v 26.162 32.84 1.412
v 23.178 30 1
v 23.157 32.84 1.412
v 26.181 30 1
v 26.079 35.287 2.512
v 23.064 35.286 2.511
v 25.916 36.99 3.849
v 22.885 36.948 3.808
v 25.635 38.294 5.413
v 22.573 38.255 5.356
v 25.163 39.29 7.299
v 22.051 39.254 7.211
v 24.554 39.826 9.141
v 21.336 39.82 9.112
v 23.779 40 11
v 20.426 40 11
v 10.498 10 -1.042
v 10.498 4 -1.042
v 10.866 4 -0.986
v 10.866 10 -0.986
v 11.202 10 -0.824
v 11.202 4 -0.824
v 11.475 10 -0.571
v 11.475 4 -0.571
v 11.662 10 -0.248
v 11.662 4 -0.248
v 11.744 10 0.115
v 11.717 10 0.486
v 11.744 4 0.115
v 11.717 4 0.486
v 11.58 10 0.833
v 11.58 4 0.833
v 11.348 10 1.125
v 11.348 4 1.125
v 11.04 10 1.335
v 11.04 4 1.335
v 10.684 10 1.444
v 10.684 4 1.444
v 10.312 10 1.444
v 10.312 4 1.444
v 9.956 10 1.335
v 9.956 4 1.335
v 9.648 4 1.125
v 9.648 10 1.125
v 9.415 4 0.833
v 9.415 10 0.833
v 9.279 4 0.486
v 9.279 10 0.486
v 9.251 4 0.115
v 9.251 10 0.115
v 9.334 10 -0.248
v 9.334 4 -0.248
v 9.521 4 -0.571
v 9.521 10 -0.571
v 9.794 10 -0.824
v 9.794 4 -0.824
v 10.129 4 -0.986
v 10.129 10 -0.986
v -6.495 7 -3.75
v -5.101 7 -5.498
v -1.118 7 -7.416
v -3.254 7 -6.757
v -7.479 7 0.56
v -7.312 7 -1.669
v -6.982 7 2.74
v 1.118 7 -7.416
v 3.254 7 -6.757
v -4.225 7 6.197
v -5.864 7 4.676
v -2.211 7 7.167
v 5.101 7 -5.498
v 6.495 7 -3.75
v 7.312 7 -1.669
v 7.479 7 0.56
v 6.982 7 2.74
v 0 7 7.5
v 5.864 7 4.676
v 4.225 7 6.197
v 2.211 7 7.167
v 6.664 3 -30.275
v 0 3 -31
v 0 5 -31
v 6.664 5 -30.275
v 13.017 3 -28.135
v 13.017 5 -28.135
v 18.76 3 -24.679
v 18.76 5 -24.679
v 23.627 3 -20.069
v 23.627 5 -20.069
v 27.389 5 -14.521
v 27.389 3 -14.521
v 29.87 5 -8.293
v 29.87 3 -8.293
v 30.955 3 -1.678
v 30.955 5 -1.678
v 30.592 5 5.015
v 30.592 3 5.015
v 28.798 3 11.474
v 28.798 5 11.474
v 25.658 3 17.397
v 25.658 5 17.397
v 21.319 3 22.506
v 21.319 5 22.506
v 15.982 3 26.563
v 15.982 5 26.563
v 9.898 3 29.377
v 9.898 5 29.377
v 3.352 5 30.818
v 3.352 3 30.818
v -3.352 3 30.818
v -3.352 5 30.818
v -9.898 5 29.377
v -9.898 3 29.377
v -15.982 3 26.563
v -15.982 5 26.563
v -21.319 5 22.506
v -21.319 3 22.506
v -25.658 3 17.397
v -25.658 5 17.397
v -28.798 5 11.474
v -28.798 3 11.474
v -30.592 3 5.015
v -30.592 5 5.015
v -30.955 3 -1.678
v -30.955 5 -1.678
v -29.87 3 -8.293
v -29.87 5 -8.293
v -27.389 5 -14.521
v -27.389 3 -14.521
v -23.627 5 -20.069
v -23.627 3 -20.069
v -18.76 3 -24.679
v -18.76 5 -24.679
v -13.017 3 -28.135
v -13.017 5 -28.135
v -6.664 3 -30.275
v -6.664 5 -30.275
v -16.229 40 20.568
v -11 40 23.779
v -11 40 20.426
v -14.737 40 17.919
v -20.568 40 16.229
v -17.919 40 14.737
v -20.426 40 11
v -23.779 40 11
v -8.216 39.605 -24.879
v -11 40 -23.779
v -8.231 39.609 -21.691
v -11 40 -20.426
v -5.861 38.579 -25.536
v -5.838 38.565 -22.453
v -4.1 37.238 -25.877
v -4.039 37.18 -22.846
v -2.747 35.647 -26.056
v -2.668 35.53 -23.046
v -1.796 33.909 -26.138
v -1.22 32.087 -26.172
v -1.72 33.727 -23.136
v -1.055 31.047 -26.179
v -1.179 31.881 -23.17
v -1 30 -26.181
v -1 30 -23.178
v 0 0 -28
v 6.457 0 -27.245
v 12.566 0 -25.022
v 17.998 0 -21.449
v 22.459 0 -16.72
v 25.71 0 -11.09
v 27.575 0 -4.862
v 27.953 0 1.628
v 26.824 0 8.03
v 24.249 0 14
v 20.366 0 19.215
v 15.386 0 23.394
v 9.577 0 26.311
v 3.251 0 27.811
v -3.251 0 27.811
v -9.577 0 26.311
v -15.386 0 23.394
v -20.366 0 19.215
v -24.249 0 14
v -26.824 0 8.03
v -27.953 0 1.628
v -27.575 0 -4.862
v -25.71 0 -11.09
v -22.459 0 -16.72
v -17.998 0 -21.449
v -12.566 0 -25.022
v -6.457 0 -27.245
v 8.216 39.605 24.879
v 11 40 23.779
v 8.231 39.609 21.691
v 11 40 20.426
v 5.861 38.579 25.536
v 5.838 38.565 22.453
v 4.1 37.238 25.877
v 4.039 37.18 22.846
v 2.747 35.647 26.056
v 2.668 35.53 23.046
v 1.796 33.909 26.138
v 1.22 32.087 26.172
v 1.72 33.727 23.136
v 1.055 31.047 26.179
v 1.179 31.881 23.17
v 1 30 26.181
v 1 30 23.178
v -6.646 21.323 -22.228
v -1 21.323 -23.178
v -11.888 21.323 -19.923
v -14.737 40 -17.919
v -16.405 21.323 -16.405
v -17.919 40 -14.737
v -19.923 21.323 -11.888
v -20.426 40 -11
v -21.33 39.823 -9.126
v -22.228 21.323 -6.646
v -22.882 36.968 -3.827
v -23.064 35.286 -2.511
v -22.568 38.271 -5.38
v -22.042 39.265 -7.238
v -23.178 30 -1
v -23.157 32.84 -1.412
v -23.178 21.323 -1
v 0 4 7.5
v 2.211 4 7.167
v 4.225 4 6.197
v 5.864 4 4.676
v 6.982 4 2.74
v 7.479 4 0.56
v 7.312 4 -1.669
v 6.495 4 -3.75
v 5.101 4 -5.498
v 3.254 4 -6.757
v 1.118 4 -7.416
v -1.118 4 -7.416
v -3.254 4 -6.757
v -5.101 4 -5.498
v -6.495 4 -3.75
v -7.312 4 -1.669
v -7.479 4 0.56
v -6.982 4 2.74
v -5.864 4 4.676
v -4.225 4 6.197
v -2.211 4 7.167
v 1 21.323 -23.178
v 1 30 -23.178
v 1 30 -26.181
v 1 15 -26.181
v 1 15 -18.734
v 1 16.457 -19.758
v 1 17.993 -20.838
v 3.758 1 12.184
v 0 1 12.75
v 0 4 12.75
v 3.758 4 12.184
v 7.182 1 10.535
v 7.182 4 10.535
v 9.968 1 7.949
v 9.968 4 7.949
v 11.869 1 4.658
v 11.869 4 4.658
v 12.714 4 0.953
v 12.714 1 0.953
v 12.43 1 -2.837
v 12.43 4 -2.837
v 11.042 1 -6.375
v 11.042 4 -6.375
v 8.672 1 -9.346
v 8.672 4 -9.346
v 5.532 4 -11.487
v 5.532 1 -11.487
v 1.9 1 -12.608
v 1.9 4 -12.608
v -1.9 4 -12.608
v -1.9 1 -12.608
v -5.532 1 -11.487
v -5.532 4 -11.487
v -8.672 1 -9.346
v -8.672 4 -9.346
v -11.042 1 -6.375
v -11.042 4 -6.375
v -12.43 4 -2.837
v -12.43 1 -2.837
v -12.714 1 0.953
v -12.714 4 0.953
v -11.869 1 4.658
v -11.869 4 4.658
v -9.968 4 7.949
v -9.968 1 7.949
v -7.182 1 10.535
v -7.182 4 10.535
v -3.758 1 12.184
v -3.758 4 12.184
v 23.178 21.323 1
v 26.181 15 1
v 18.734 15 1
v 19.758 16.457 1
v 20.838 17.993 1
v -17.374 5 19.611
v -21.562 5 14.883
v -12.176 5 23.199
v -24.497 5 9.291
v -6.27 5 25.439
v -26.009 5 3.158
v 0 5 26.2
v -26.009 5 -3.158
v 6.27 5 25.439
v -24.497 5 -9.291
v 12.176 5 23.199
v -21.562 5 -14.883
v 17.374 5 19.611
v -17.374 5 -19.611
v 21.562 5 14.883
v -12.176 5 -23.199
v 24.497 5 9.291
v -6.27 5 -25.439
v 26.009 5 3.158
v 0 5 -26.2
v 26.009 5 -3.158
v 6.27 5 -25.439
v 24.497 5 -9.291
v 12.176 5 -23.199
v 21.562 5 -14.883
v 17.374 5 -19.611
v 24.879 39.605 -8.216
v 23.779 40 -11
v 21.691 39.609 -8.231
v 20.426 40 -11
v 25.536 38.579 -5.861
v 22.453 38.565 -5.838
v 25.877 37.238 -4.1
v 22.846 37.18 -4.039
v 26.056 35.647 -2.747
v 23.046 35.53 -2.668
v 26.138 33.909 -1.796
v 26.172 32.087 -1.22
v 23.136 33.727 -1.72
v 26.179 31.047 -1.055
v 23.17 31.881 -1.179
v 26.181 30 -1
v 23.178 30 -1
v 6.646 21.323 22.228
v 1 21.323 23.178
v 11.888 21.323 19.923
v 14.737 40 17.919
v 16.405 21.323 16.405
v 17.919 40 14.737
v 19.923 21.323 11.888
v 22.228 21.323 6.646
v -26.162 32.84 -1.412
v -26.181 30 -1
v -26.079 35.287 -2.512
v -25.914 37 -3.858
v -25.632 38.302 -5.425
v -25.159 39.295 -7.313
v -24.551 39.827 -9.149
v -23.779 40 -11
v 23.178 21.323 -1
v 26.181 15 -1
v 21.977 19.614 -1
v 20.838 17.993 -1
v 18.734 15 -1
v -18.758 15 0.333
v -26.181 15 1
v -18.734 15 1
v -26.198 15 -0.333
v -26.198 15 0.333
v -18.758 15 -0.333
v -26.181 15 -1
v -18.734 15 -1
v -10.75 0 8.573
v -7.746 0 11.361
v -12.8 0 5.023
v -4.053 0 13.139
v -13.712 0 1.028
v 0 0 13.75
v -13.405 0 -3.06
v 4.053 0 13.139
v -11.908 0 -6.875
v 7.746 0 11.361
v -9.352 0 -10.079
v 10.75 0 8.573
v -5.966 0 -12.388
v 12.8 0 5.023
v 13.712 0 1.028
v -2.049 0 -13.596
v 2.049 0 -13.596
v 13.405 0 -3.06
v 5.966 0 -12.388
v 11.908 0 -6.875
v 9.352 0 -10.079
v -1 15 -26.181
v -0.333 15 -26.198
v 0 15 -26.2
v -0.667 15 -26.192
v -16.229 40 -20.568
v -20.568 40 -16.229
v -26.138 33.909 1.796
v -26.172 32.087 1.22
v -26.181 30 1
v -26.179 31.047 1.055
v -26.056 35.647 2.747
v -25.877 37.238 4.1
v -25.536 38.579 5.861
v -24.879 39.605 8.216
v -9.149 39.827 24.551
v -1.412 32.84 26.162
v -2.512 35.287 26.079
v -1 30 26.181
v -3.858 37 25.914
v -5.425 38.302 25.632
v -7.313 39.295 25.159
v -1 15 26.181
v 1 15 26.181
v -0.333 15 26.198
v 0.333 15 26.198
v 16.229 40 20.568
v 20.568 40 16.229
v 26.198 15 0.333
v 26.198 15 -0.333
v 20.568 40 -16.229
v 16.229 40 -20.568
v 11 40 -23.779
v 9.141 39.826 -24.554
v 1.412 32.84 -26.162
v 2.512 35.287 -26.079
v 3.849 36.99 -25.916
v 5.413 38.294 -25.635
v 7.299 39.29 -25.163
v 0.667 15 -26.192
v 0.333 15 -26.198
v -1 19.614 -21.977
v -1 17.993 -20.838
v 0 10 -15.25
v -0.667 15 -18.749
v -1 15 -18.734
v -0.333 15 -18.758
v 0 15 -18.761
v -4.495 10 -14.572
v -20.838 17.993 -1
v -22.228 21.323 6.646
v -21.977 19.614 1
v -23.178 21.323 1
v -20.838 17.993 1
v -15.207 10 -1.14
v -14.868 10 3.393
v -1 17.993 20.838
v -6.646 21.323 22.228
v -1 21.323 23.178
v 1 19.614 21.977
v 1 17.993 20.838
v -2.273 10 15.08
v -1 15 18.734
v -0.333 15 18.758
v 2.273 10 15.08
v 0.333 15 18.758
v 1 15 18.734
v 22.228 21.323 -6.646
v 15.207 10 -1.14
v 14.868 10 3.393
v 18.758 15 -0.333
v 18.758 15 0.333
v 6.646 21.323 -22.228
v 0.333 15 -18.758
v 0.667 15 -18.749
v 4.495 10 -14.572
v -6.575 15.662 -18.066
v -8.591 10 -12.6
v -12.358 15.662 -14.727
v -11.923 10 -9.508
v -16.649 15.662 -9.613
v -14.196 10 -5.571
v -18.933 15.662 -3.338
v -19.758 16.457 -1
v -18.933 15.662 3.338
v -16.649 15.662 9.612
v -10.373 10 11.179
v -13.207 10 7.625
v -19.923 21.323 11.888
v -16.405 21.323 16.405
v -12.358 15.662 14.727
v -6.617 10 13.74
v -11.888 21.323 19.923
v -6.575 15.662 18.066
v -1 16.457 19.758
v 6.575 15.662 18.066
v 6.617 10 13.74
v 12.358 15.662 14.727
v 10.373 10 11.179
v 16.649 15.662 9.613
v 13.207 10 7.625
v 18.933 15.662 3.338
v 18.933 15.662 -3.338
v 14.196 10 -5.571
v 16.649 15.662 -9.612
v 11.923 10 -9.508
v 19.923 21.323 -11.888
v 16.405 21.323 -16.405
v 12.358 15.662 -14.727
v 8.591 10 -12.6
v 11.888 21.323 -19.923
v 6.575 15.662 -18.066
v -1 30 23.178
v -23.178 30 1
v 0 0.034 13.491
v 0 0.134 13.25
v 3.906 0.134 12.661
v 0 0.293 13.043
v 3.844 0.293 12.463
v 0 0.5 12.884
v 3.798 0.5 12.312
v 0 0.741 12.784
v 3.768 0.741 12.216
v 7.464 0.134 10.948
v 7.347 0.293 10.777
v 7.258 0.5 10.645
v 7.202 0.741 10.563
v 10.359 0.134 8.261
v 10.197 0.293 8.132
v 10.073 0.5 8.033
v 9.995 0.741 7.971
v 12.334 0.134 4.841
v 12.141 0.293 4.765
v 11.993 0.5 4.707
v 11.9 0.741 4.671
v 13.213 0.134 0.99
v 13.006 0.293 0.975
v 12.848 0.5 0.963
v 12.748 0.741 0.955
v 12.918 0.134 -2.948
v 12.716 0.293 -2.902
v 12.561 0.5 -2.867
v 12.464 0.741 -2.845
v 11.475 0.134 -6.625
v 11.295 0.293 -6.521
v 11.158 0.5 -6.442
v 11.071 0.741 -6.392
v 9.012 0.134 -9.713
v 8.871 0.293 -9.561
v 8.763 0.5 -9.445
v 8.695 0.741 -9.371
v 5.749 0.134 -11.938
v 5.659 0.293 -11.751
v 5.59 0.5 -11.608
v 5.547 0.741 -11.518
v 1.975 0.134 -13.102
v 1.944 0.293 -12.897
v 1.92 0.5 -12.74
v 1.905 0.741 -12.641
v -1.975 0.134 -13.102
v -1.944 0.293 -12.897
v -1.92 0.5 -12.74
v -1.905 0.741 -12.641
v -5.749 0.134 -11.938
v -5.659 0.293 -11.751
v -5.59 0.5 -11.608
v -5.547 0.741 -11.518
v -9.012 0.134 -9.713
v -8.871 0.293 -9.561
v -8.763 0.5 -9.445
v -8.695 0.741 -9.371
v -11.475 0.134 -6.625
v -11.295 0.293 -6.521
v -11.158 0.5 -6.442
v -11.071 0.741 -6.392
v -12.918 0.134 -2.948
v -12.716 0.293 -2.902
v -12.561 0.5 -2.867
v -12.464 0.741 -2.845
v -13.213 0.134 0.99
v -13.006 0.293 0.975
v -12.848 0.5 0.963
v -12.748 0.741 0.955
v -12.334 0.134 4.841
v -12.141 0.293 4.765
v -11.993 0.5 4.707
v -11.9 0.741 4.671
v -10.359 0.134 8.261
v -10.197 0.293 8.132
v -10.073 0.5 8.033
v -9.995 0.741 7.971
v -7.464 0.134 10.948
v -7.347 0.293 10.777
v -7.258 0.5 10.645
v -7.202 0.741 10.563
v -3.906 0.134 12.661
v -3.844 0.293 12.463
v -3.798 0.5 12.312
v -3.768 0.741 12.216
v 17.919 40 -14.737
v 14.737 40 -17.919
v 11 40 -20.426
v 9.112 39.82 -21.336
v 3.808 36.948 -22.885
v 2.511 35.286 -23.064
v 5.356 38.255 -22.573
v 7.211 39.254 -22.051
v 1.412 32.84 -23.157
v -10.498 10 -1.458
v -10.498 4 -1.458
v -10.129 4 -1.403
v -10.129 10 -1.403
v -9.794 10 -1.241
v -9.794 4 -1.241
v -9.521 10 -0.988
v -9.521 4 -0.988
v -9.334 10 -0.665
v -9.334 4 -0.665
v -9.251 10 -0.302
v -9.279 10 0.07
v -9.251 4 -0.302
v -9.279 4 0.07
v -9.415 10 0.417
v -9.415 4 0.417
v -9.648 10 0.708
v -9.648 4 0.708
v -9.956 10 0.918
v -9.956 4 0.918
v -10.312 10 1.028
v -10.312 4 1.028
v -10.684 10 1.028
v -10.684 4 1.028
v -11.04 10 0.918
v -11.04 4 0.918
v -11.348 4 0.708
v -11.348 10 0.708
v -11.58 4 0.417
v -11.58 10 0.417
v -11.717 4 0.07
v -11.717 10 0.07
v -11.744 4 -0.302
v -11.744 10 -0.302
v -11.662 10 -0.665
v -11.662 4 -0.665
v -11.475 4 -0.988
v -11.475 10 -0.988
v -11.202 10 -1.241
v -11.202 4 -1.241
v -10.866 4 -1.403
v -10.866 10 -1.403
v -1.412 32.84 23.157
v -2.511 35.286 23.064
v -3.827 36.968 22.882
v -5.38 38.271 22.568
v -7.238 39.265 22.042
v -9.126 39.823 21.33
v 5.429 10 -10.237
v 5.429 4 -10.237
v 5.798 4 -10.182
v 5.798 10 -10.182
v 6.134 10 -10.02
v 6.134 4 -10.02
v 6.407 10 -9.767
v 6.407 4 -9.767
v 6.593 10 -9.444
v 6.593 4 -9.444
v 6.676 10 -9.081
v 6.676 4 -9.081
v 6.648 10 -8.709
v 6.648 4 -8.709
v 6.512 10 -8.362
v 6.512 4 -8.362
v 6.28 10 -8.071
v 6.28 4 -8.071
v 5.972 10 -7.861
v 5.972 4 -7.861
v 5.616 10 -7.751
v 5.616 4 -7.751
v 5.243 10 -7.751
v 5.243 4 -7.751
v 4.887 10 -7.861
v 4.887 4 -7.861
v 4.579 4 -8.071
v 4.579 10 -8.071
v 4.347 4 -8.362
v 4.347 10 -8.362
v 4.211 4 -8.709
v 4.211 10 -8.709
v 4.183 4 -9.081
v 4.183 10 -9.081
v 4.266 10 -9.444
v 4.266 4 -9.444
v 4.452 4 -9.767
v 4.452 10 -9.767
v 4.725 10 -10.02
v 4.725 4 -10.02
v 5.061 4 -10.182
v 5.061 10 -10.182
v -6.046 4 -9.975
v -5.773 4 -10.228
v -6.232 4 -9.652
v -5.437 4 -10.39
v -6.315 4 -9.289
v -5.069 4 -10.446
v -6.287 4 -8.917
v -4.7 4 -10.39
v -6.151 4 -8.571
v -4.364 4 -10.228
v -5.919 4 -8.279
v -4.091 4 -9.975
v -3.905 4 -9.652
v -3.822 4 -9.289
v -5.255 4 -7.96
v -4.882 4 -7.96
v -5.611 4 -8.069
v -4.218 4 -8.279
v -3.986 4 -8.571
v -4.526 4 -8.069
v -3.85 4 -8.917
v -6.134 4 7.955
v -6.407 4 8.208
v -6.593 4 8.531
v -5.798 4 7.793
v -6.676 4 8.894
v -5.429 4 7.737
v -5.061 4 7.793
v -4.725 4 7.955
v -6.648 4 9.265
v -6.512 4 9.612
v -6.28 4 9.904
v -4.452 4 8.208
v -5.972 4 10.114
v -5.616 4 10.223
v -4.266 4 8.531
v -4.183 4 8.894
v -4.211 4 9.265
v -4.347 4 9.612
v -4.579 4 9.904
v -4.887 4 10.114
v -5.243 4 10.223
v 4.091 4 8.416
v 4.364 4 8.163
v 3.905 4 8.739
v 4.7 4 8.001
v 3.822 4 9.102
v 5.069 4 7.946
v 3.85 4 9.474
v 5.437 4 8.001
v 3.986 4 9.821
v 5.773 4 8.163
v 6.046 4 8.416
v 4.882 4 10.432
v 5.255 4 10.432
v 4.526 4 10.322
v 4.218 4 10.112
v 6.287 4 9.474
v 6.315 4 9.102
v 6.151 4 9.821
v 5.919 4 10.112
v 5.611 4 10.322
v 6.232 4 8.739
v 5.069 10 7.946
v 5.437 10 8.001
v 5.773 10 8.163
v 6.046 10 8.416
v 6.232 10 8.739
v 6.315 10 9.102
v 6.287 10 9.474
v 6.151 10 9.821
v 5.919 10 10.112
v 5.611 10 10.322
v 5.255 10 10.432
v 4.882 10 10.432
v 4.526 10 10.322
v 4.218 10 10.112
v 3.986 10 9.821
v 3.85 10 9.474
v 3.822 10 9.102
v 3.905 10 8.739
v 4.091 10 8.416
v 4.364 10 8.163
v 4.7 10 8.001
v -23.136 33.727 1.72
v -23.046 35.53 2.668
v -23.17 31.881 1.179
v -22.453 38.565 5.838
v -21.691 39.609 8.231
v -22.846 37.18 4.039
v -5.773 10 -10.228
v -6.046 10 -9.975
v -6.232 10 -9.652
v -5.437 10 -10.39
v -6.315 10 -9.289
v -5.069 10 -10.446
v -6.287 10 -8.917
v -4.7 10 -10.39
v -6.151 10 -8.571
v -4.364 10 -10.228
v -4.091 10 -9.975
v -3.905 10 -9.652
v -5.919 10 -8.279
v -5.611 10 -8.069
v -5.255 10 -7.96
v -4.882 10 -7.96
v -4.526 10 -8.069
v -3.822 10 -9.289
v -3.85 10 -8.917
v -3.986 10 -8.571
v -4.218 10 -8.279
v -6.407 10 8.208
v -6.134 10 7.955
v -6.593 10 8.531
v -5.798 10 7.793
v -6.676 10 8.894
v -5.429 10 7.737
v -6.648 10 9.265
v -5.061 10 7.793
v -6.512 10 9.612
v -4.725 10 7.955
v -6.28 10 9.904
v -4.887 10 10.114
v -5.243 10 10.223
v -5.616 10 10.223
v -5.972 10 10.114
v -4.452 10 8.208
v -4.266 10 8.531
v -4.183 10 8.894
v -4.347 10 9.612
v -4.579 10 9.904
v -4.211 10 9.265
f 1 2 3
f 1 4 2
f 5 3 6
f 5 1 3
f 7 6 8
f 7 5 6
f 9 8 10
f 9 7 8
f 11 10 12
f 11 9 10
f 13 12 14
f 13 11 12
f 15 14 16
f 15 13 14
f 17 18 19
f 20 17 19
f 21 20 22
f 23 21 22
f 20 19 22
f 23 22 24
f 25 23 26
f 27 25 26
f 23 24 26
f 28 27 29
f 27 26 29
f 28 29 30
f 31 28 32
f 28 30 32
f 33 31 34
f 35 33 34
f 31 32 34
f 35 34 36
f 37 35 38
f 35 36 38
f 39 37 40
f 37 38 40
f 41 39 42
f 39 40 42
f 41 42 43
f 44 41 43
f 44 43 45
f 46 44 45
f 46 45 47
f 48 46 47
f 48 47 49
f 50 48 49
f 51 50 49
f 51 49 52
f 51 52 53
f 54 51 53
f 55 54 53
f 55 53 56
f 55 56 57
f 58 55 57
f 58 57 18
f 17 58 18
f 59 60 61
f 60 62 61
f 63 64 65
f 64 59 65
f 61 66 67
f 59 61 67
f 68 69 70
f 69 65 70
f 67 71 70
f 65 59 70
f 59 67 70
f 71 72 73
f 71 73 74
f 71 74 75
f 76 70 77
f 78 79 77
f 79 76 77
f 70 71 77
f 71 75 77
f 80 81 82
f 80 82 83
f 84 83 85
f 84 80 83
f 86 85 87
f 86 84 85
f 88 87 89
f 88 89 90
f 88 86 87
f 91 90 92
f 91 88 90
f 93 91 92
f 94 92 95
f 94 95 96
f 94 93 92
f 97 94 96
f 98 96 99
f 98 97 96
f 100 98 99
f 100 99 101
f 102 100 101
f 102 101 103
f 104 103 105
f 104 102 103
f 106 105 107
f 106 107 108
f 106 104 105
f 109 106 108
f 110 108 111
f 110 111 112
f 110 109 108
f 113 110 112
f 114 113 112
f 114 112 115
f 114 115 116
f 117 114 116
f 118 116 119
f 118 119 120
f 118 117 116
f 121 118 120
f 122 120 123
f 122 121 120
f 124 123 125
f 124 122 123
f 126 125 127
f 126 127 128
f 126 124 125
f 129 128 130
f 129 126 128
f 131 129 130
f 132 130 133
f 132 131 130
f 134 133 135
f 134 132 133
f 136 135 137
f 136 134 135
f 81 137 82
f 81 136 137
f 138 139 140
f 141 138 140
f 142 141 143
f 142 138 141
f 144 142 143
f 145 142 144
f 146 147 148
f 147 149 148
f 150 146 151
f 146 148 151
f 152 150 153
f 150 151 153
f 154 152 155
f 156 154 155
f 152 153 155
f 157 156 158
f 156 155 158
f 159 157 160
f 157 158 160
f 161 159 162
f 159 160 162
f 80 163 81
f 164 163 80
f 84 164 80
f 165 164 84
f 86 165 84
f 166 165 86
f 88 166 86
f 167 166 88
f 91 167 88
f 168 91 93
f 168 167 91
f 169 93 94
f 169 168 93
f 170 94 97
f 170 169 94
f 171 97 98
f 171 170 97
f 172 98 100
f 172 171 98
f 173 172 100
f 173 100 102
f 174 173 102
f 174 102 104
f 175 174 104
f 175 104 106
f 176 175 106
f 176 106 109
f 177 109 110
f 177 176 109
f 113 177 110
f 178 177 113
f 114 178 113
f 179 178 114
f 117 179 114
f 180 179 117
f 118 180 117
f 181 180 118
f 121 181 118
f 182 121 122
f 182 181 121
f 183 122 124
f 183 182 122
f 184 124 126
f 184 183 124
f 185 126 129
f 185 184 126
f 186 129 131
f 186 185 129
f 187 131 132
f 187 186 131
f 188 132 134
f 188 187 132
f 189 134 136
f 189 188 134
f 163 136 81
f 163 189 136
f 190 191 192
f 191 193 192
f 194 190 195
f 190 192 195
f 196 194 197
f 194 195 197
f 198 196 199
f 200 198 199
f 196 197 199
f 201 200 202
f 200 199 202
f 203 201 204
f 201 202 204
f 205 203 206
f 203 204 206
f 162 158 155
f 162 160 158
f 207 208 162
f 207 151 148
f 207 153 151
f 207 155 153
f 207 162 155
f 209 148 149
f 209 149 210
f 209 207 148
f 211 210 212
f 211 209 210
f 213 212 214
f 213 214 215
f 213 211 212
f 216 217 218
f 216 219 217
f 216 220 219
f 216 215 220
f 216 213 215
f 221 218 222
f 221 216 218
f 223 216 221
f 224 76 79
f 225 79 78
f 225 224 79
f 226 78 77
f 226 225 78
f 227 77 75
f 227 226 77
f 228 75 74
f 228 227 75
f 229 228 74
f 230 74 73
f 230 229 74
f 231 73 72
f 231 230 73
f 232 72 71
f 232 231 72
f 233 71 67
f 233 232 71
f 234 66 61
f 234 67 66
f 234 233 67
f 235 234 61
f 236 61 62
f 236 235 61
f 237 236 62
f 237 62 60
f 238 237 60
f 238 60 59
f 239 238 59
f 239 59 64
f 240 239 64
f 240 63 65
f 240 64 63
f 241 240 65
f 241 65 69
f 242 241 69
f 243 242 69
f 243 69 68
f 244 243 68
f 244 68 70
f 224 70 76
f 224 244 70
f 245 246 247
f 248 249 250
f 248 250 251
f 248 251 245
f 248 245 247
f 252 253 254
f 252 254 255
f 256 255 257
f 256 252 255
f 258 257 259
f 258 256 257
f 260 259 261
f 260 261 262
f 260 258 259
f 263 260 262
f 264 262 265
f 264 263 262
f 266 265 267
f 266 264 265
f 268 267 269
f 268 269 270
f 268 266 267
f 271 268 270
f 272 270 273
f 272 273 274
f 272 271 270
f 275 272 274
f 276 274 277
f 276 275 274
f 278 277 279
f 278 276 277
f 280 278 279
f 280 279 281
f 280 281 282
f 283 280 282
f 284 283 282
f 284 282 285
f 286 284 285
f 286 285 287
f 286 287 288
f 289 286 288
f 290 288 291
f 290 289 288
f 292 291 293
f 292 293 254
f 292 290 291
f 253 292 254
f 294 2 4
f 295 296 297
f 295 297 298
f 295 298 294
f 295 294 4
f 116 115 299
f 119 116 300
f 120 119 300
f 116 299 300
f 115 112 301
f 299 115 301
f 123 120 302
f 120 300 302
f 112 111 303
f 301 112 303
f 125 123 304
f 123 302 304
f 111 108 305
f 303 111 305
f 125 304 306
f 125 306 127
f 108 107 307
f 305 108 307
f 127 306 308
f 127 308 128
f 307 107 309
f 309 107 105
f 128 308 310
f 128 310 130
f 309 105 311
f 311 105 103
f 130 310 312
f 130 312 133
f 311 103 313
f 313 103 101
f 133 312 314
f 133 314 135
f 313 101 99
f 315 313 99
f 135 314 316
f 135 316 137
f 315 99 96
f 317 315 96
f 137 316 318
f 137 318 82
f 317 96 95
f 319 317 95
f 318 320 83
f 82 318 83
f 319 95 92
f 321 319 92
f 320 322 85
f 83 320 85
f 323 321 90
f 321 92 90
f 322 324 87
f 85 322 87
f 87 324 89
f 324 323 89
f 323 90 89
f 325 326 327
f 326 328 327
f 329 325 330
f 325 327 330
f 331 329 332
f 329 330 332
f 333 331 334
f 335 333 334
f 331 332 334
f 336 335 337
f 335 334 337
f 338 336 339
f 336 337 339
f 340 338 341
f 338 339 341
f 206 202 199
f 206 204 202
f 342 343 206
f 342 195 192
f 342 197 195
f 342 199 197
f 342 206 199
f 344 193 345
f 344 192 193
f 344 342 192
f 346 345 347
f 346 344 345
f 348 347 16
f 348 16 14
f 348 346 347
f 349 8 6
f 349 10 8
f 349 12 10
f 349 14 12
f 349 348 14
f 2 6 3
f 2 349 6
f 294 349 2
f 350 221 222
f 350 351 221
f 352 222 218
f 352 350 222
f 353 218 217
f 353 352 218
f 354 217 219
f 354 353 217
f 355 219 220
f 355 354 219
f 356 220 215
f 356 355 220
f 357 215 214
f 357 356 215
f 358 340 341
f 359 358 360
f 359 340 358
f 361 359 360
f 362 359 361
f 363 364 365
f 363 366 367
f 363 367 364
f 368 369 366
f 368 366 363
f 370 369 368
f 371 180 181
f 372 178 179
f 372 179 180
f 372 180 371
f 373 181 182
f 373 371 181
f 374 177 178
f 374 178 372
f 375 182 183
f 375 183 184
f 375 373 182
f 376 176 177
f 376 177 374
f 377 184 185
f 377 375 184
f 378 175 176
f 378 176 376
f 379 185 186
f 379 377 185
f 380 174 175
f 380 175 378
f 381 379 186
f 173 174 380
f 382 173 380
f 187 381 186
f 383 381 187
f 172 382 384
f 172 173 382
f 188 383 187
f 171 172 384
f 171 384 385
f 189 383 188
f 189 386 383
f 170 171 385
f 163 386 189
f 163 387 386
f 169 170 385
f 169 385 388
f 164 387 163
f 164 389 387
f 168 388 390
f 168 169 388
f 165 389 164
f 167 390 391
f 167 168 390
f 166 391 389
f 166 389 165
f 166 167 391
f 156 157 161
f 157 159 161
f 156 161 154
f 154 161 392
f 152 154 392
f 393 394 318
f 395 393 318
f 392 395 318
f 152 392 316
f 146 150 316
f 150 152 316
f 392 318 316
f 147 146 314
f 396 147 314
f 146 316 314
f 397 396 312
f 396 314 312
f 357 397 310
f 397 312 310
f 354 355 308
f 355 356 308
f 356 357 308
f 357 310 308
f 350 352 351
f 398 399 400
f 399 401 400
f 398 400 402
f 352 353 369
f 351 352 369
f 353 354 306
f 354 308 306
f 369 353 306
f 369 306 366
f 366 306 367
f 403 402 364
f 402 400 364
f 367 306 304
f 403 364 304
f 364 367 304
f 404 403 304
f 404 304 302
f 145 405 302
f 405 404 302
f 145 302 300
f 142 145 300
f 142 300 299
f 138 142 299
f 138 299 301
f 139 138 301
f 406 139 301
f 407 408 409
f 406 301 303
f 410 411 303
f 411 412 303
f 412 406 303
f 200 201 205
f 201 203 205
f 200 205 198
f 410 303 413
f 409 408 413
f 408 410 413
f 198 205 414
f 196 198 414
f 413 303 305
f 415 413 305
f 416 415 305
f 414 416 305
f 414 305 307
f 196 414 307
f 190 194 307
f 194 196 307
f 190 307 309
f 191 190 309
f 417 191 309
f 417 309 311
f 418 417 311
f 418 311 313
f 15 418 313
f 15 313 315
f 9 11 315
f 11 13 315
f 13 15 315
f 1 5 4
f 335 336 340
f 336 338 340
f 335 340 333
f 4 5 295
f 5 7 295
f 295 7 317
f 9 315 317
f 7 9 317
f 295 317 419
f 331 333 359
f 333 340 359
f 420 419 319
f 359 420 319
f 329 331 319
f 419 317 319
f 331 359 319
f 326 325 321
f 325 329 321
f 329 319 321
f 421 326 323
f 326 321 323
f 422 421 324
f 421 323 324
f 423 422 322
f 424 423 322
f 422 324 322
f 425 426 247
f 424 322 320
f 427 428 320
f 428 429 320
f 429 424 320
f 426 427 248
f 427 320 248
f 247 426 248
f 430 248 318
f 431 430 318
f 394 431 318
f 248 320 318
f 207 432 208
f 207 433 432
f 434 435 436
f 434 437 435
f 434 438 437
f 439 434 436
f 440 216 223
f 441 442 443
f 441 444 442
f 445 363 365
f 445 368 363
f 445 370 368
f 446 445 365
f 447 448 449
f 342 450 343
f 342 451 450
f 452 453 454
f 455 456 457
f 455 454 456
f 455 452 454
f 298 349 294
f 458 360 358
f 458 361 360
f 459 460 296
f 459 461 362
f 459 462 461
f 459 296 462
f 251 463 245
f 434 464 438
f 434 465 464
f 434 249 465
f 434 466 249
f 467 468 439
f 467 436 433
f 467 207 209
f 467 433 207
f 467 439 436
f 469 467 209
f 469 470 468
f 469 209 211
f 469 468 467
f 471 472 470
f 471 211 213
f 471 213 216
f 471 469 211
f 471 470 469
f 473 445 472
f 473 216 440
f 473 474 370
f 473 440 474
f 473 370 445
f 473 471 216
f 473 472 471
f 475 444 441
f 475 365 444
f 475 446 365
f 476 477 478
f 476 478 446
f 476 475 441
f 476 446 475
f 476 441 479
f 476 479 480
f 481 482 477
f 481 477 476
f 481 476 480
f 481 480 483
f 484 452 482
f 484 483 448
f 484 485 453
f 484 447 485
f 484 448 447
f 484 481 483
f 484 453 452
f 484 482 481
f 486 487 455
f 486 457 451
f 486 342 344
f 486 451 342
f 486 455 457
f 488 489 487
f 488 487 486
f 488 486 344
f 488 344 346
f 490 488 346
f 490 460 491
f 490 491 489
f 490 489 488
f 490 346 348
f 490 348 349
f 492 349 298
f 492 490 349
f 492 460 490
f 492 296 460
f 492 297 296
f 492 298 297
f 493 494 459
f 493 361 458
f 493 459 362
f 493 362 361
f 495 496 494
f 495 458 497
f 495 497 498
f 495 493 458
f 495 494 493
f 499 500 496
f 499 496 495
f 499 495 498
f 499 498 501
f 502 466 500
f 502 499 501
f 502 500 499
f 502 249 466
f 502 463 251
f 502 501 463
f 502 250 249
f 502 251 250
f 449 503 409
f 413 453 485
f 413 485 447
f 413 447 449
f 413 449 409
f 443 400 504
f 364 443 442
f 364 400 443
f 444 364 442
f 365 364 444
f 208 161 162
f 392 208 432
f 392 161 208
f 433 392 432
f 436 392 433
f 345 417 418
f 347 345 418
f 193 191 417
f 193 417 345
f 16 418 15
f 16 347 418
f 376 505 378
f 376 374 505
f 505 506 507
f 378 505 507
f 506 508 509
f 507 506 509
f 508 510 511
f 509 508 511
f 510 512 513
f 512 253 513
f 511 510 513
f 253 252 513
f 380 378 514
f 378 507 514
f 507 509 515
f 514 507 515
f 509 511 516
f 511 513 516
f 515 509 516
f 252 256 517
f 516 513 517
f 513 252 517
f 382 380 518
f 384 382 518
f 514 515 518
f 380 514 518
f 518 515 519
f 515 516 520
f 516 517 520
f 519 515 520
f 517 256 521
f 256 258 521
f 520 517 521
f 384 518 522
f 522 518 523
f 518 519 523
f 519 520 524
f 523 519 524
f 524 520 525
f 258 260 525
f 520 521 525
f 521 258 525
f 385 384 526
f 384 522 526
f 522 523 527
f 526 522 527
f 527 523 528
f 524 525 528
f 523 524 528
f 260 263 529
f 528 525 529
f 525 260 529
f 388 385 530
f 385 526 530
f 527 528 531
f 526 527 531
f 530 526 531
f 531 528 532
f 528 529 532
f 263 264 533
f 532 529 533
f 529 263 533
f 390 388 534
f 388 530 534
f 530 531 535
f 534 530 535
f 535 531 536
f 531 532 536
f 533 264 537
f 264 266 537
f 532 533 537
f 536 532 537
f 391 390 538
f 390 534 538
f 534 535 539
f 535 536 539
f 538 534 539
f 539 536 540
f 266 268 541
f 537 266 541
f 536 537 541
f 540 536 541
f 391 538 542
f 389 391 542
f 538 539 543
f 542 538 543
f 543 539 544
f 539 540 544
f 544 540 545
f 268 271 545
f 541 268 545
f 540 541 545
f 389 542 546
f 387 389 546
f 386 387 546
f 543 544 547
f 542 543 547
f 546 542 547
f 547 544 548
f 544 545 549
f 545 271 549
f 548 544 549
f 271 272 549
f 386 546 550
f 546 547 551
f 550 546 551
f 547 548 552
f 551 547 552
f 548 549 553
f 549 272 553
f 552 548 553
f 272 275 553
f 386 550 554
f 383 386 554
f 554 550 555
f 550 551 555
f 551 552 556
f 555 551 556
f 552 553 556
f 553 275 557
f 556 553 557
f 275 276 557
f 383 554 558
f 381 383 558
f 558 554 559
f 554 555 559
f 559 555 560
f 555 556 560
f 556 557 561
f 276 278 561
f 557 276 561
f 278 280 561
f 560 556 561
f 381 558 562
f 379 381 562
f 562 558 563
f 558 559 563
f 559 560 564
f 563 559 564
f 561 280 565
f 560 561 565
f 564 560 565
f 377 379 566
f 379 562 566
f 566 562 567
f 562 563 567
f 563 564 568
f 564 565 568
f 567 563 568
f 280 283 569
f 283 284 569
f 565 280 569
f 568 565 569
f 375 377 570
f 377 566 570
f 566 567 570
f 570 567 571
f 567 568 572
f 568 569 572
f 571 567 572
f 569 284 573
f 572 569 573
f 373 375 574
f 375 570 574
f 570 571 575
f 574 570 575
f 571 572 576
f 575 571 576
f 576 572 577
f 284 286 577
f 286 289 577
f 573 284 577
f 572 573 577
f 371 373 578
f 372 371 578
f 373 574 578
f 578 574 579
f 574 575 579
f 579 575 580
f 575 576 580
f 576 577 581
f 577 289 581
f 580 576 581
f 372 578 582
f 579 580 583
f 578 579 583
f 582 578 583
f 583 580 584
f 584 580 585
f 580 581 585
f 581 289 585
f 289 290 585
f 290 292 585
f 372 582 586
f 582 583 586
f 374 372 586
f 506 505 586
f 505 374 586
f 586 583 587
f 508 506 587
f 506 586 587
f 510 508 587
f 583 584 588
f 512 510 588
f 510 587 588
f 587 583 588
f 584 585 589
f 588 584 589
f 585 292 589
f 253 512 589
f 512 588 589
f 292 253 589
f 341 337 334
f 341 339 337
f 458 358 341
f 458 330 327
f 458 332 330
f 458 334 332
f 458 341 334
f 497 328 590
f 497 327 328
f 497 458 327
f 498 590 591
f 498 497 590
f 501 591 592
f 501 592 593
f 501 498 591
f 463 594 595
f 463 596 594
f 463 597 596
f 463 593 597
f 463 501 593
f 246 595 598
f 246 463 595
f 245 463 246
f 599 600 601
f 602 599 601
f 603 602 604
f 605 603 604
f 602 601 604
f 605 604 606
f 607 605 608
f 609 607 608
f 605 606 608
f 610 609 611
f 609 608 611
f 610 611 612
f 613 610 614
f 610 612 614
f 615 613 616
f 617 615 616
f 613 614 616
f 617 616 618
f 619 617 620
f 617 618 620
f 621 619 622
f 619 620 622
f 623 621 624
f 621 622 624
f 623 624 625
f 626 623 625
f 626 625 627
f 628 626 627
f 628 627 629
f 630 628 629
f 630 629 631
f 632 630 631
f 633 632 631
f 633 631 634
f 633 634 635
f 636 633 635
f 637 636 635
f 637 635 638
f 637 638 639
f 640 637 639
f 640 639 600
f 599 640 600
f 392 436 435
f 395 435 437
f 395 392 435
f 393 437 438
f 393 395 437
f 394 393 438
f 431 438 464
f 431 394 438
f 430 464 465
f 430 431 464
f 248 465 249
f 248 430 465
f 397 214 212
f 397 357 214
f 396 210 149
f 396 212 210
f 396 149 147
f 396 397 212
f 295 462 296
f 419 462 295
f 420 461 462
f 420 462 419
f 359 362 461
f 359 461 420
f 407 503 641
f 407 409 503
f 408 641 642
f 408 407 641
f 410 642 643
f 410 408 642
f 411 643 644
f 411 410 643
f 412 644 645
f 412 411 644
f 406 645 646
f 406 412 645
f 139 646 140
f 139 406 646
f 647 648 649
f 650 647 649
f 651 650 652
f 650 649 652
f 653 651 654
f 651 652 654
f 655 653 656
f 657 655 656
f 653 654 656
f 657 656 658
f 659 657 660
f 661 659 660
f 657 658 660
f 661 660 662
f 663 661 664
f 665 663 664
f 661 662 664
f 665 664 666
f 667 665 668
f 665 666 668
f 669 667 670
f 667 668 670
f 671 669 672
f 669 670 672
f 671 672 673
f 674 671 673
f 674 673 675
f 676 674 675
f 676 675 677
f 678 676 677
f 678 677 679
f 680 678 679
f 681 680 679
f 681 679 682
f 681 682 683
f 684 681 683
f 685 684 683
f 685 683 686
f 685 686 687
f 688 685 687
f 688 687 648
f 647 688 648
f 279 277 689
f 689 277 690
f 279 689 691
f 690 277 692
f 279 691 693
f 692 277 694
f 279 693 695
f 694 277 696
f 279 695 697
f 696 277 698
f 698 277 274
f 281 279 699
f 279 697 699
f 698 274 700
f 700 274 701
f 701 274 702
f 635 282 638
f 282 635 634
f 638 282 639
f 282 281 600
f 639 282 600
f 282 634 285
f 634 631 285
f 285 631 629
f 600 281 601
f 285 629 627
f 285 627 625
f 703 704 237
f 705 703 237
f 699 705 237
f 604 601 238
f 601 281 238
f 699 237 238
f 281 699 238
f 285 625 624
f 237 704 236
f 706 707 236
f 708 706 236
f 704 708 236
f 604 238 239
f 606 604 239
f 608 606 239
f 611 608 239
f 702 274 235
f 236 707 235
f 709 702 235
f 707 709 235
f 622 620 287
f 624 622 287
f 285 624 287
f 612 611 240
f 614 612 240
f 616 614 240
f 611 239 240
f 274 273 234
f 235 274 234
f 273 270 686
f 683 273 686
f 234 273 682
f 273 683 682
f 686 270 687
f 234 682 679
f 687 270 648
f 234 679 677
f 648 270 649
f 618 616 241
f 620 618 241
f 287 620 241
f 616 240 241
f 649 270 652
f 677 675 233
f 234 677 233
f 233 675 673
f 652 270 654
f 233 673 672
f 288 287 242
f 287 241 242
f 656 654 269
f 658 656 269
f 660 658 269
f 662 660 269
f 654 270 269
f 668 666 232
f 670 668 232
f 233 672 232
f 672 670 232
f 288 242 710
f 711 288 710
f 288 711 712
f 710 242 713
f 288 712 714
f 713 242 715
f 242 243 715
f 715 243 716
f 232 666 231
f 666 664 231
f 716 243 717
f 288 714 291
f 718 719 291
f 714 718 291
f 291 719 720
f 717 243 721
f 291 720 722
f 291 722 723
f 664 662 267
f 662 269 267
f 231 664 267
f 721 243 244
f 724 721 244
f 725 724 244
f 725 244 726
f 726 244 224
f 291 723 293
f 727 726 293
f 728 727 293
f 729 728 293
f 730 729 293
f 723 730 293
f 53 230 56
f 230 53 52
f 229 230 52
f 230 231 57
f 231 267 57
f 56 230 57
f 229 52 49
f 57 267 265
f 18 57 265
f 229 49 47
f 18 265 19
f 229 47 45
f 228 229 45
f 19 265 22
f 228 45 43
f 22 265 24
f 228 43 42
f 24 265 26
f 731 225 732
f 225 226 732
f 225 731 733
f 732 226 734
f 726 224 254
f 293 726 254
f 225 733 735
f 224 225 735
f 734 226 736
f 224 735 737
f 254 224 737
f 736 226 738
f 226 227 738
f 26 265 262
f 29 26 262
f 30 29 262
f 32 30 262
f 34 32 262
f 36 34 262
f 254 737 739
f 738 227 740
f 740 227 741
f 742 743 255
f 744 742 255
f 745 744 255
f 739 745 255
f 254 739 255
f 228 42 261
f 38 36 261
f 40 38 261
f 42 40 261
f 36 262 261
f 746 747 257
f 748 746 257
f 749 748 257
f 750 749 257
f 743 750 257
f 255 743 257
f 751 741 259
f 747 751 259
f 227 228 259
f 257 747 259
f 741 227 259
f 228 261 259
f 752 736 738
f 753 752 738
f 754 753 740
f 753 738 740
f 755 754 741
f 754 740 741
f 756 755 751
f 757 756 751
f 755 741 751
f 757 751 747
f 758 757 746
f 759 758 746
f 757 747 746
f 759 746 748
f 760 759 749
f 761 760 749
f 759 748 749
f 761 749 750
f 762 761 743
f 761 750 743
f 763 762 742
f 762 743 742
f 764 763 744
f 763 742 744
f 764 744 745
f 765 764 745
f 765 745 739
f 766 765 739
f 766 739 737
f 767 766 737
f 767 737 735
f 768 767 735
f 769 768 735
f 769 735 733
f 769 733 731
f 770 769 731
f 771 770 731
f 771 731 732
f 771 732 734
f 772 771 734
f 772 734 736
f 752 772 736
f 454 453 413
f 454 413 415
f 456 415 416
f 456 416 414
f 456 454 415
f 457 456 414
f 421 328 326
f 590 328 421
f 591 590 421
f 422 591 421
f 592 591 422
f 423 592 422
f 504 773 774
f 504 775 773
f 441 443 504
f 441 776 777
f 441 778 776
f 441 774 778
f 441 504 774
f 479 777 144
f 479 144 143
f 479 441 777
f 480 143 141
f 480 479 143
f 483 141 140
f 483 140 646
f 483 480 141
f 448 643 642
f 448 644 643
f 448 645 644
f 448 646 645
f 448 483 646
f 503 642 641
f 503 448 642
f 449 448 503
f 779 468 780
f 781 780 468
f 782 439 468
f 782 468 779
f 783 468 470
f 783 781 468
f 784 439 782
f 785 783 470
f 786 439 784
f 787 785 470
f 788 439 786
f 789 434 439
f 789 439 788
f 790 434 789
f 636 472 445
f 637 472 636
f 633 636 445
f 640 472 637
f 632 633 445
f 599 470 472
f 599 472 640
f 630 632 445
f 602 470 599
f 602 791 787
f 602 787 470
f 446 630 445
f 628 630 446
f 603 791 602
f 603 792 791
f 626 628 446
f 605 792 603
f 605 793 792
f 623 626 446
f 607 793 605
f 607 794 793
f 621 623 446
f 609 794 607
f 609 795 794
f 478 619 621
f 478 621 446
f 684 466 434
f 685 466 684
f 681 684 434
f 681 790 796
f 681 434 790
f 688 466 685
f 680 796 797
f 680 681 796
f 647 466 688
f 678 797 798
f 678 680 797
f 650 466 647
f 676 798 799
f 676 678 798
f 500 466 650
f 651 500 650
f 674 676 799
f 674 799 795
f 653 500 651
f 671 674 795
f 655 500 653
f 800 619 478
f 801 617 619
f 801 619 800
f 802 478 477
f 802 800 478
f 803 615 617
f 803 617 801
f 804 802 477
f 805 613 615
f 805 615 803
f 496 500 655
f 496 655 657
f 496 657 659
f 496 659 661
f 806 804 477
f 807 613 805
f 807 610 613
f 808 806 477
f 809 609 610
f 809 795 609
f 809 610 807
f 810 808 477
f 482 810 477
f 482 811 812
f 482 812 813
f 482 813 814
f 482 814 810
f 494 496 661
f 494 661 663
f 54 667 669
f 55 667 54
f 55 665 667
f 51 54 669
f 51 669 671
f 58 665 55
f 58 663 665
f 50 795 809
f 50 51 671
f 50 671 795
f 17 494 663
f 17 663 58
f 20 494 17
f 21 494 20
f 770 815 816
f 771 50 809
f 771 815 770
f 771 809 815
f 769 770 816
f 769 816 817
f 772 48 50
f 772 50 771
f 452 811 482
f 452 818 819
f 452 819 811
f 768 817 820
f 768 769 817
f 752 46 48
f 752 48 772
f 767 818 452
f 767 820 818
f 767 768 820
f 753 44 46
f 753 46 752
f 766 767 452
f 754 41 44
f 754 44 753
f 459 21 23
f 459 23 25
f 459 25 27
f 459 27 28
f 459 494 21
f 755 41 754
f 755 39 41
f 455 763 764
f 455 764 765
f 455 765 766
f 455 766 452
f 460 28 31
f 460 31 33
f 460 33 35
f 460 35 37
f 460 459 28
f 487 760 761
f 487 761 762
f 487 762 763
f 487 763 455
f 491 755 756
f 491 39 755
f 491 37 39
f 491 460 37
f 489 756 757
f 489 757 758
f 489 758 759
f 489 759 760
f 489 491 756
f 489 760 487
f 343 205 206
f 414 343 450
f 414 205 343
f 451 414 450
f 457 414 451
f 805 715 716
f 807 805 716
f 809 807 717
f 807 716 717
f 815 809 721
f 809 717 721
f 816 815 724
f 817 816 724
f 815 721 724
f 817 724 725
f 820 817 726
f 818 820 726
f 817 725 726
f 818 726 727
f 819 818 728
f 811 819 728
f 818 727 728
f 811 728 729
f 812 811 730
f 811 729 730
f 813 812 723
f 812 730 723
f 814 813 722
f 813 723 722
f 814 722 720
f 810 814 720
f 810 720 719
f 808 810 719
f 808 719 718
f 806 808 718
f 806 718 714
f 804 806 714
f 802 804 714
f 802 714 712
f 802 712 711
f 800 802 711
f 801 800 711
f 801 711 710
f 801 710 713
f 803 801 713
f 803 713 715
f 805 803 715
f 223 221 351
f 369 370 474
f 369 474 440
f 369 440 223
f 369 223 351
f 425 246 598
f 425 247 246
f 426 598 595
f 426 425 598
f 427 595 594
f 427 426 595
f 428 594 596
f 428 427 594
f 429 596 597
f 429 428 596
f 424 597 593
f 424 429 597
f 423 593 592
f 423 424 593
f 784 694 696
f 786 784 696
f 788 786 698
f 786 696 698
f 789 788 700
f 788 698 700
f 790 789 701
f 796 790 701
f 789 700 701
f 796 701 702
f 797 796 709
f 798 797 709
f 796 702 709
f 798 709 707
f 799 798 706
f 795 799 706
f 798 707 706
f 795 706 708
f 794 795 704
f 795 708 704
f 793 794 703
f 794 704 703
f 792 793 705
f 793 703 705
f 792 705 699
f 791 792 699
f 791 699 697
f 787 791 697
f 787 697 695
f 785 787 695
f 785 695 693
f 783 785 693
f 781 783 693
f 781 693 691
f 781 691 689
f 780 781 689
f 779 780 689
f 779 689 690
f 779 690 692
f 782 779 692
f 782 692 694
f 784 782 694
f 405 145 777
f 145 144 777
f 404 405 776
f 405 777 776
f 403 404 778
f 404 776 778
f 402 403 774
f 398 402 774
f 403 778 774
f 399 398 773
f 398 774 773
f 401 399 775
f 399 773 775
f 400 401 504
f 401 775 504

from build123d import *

# Parameters (mm, degrees)
SKETCH1_R               = 15.25
SKETCH1_R_2             = 12.75
BOSS_EXTRUDE1_DEPTH     = 4
SKETCH2_R               = 15.25
SKETCH2_R_2             = 7.5
BOSS_EXTRUDE2_DEPTH     = 6
BOSS_EXTRUDE3_START     = -3
SKETCH3_R               = 15.25
BOSS_EXTRUDE3_DEPTH     = 3
SKETCH4_R               = 1.25
CUT_EXTRUDE1_DEPTH      = 10
CUT_EXTRUDE_THIN1_START = -70
CUT_EXTRUDE_THIN1_DEPTH = 25
SKETCH7_R               = 31
SKETCH7_R_2             = 26
BOSS_EXTRUDE4_DEPTH     = 5
CHAMFER3_SIZE           = 3
FILLET3_R               = 1
FILLET4_R               = 10


with BuildPart() as part:
    # Sketch1 → Boss-Extrude1 (new body)
    with BuildSketch(Plane(origin=(0, 0, 0), x_dir=(1, 0, 0), z_dir=(0, 1, 0))):
        with Locations(Location((0, 0, 0), (0, 0, 270))):
            Circle(SKETCH1_R)
        with Locations(Location((0, 0, 0), (0, 0, 270))):
            Circle(SKETCH1_R_2, mode=Mode.SUBTRACT)
    extrude(amount=BOSS_EXTRUDE1_DEPTH)

    # Sketch2 → Boss-Extrude2 (add)
    with BuildSketch(Plane(origin=(0, 4, 0), x_dir=(1, 0, 0), z_dir=(0, 1, 0))):
        with Locations(Location((0, 0, 0), (0, 0, 270))):
            Circle(SKETCH2_R)
        with Locations(Location((0, 0, 0), (0, 0, 270))):
            Circle(SKETCH2_R_2, mode=Mode.SUBTRACT)
    extrude(amount=BOSS_EXTRUDE2_DEPTH)

    # Sketch3 → Boss-Extrude3 (add)
    with BuildSketch(Plane(origin=(0, 10, 0), x_dir=(1, 0, 0), z_dir=(0, 1, 0)).offset(BOSS_EXTRUDE3_START)):
        with Locations(Location((0, 0, 0), (0, 0, 270))):
            Circle(SKETCH3_R)
    extrude(amount=BOSS_EXTRUDE3_DEPTH)

    # Sketch4 → Cut-Extrude1 (cut)
    with BuildSketch(Plane(origin=(0, 4, 0), x_dir=(-1, 0, 0), z_dir=(0, -1, 0))):
        with Locations(Location((5.42938356, -8.987312955, 0), (0, 0, 90))):
            Circle(SKETCH4_R)
        with Locations(Location((-5.068549551, -9.195640568, 0), (0, 0, 90))):
            Circle(SKETCH4_R)
        with Locations(Location((-10.497933111, -0.208327612, 0), (0, 0, 90))):
            Circle(SKETCH4_R)
        with Locations(Location((-5.42938356, 8.987312955, 0), (0, 0, 90))):
            Circle(SKETCH4_R)
        with Locations(Location((5.068549551, 9.195640568, 0), (0, 0, 90))):
            Circle(SKETCH4_R)
        with Locations(Location((10.497933111, 0.208327612, 0), (0, 0, 90))):
            Circle(SKETCH4_R)
    extrude(amount=-CUT_EXTRUDE1_DEPTH, mode=Mode.SUBTRACT)

    # Sketch5 → Revolve1 (revolve)
    with BuildSketch(Plane.XY, mode=Mode.PRIVATE) as revolve1_sk:
        Polygon((-15.25, 0), (-26.2, 0), (-26.2, 20), (-26.2, 40), (-23.2, 40), (-23.2, 21.323043804), (-15.25, 10), align=None)
    revolve(revolve1_sk.sketch.rotate(Axis((0, 0, 0), (0, 1, 0)), 270), axis=Axis((0, 0, 0), (0, 1, 0)))

    # Cut-Extrude-Thin1: read off the stored shape, not the designer's step
    # Cut-Extrude-Thin1 outline → Cut-Extrude-Thin1 (cut)
    with BuildSketch(Plane(origin=(0, 85, 0), x_dir=(1, 0, 0), z_dir=(0, 1, 0)).offset(CUT_EXTRUDE_THIN1_START)):
        with BuildLine():
            Line((1, 1), (1, 26.180909075))
            ThreePointArc((1, 26.180909075), (0, 26.2), (-1, 26.180909075))
            Line((-1, 26.180909075), (-1, 1))
            Line((-1, 1), (1, 1))
        make_face()
        with BuildLine():
            Line((1, 1), (1, -1))
            Line((1, -1), (26.180909075, -1))
            ThreePointArc((26.180909075, -1), (26.2, 0), (26.180909075, 1))
            Line((26.180909075, 1), (1, 1))
        make_face()
        with BuildLine():
            Line((1, -1), (-1, -1))
            Line((-1, -1), (-1, -26.180909075))
            ThreePointArc((-1, -26.180909075), (0, -26.2), (1, -26.180909075))
            Line((1, -26.180909075), (1, -1))
        make_face()
        with BuildLine():
            Line((-1, -1), (-1, 1))
            Line((-1, 1), (-26.180909075, 1))
            ThreePointArc((-26.180909075, 1), (-26.2, 0), (-26.180909075, -1))
            Line((-26.180909075, -1), (-1, -1))
        make_face()
    extrude(amount=CUT_EXTRUDE_THIN1_DEPTH, mode=Mode.SUBTRACT)

    # Sketch7 → Boss-Extrude4 (add)
    with BuildSketch(Plane(origin=(0, 0, 0), x_dir=(-1, 0, 0), z_dir=(0, -1, 0))):
        with Locations(Location((0, 0, 0), (0, 0, 90))):
            Circle(SKETCH7_R)
        Circle(SKETCH7_R_2, mode=Mode.SUBTRACT)
    extrude(amount=-BOSS_EXTRUDE4_DEPTH)

    # Chamfer3
    chamfer3_edges = [part.edges().sort_by_distance(p)[0] for p in [
        (0, 0, 31),
    ]]
    chamfer(chamfer3_edges, length=CHAMFER3_SIZE)

    # Fillet3
    fillet3_edges = [part.edges().sort_by_distance(p)[0] for p in [
        (0, 0, -12.75),
    ]]
    fillet(fillet3_edges, radius=FILLET3_R)

    # Fillet4
    fillet4_edges = [part.edges().sort_by_distance(p)[0] for p in [
        (24.679673666, 40, 1),
        (-24.679673666, 40, -1),
        (-1, 40, 24.679673666),
        (1, 40, -24.679673666),
        (24.679673666, 40, -1),
        (-24.679673666, 40, 1),
        (1, 40, 24.679673666),
        (-1, 40, -24.679673666),
    ]]
    fillet(fillet4_edges, radius=FILLET4_R)


solid = part.part
